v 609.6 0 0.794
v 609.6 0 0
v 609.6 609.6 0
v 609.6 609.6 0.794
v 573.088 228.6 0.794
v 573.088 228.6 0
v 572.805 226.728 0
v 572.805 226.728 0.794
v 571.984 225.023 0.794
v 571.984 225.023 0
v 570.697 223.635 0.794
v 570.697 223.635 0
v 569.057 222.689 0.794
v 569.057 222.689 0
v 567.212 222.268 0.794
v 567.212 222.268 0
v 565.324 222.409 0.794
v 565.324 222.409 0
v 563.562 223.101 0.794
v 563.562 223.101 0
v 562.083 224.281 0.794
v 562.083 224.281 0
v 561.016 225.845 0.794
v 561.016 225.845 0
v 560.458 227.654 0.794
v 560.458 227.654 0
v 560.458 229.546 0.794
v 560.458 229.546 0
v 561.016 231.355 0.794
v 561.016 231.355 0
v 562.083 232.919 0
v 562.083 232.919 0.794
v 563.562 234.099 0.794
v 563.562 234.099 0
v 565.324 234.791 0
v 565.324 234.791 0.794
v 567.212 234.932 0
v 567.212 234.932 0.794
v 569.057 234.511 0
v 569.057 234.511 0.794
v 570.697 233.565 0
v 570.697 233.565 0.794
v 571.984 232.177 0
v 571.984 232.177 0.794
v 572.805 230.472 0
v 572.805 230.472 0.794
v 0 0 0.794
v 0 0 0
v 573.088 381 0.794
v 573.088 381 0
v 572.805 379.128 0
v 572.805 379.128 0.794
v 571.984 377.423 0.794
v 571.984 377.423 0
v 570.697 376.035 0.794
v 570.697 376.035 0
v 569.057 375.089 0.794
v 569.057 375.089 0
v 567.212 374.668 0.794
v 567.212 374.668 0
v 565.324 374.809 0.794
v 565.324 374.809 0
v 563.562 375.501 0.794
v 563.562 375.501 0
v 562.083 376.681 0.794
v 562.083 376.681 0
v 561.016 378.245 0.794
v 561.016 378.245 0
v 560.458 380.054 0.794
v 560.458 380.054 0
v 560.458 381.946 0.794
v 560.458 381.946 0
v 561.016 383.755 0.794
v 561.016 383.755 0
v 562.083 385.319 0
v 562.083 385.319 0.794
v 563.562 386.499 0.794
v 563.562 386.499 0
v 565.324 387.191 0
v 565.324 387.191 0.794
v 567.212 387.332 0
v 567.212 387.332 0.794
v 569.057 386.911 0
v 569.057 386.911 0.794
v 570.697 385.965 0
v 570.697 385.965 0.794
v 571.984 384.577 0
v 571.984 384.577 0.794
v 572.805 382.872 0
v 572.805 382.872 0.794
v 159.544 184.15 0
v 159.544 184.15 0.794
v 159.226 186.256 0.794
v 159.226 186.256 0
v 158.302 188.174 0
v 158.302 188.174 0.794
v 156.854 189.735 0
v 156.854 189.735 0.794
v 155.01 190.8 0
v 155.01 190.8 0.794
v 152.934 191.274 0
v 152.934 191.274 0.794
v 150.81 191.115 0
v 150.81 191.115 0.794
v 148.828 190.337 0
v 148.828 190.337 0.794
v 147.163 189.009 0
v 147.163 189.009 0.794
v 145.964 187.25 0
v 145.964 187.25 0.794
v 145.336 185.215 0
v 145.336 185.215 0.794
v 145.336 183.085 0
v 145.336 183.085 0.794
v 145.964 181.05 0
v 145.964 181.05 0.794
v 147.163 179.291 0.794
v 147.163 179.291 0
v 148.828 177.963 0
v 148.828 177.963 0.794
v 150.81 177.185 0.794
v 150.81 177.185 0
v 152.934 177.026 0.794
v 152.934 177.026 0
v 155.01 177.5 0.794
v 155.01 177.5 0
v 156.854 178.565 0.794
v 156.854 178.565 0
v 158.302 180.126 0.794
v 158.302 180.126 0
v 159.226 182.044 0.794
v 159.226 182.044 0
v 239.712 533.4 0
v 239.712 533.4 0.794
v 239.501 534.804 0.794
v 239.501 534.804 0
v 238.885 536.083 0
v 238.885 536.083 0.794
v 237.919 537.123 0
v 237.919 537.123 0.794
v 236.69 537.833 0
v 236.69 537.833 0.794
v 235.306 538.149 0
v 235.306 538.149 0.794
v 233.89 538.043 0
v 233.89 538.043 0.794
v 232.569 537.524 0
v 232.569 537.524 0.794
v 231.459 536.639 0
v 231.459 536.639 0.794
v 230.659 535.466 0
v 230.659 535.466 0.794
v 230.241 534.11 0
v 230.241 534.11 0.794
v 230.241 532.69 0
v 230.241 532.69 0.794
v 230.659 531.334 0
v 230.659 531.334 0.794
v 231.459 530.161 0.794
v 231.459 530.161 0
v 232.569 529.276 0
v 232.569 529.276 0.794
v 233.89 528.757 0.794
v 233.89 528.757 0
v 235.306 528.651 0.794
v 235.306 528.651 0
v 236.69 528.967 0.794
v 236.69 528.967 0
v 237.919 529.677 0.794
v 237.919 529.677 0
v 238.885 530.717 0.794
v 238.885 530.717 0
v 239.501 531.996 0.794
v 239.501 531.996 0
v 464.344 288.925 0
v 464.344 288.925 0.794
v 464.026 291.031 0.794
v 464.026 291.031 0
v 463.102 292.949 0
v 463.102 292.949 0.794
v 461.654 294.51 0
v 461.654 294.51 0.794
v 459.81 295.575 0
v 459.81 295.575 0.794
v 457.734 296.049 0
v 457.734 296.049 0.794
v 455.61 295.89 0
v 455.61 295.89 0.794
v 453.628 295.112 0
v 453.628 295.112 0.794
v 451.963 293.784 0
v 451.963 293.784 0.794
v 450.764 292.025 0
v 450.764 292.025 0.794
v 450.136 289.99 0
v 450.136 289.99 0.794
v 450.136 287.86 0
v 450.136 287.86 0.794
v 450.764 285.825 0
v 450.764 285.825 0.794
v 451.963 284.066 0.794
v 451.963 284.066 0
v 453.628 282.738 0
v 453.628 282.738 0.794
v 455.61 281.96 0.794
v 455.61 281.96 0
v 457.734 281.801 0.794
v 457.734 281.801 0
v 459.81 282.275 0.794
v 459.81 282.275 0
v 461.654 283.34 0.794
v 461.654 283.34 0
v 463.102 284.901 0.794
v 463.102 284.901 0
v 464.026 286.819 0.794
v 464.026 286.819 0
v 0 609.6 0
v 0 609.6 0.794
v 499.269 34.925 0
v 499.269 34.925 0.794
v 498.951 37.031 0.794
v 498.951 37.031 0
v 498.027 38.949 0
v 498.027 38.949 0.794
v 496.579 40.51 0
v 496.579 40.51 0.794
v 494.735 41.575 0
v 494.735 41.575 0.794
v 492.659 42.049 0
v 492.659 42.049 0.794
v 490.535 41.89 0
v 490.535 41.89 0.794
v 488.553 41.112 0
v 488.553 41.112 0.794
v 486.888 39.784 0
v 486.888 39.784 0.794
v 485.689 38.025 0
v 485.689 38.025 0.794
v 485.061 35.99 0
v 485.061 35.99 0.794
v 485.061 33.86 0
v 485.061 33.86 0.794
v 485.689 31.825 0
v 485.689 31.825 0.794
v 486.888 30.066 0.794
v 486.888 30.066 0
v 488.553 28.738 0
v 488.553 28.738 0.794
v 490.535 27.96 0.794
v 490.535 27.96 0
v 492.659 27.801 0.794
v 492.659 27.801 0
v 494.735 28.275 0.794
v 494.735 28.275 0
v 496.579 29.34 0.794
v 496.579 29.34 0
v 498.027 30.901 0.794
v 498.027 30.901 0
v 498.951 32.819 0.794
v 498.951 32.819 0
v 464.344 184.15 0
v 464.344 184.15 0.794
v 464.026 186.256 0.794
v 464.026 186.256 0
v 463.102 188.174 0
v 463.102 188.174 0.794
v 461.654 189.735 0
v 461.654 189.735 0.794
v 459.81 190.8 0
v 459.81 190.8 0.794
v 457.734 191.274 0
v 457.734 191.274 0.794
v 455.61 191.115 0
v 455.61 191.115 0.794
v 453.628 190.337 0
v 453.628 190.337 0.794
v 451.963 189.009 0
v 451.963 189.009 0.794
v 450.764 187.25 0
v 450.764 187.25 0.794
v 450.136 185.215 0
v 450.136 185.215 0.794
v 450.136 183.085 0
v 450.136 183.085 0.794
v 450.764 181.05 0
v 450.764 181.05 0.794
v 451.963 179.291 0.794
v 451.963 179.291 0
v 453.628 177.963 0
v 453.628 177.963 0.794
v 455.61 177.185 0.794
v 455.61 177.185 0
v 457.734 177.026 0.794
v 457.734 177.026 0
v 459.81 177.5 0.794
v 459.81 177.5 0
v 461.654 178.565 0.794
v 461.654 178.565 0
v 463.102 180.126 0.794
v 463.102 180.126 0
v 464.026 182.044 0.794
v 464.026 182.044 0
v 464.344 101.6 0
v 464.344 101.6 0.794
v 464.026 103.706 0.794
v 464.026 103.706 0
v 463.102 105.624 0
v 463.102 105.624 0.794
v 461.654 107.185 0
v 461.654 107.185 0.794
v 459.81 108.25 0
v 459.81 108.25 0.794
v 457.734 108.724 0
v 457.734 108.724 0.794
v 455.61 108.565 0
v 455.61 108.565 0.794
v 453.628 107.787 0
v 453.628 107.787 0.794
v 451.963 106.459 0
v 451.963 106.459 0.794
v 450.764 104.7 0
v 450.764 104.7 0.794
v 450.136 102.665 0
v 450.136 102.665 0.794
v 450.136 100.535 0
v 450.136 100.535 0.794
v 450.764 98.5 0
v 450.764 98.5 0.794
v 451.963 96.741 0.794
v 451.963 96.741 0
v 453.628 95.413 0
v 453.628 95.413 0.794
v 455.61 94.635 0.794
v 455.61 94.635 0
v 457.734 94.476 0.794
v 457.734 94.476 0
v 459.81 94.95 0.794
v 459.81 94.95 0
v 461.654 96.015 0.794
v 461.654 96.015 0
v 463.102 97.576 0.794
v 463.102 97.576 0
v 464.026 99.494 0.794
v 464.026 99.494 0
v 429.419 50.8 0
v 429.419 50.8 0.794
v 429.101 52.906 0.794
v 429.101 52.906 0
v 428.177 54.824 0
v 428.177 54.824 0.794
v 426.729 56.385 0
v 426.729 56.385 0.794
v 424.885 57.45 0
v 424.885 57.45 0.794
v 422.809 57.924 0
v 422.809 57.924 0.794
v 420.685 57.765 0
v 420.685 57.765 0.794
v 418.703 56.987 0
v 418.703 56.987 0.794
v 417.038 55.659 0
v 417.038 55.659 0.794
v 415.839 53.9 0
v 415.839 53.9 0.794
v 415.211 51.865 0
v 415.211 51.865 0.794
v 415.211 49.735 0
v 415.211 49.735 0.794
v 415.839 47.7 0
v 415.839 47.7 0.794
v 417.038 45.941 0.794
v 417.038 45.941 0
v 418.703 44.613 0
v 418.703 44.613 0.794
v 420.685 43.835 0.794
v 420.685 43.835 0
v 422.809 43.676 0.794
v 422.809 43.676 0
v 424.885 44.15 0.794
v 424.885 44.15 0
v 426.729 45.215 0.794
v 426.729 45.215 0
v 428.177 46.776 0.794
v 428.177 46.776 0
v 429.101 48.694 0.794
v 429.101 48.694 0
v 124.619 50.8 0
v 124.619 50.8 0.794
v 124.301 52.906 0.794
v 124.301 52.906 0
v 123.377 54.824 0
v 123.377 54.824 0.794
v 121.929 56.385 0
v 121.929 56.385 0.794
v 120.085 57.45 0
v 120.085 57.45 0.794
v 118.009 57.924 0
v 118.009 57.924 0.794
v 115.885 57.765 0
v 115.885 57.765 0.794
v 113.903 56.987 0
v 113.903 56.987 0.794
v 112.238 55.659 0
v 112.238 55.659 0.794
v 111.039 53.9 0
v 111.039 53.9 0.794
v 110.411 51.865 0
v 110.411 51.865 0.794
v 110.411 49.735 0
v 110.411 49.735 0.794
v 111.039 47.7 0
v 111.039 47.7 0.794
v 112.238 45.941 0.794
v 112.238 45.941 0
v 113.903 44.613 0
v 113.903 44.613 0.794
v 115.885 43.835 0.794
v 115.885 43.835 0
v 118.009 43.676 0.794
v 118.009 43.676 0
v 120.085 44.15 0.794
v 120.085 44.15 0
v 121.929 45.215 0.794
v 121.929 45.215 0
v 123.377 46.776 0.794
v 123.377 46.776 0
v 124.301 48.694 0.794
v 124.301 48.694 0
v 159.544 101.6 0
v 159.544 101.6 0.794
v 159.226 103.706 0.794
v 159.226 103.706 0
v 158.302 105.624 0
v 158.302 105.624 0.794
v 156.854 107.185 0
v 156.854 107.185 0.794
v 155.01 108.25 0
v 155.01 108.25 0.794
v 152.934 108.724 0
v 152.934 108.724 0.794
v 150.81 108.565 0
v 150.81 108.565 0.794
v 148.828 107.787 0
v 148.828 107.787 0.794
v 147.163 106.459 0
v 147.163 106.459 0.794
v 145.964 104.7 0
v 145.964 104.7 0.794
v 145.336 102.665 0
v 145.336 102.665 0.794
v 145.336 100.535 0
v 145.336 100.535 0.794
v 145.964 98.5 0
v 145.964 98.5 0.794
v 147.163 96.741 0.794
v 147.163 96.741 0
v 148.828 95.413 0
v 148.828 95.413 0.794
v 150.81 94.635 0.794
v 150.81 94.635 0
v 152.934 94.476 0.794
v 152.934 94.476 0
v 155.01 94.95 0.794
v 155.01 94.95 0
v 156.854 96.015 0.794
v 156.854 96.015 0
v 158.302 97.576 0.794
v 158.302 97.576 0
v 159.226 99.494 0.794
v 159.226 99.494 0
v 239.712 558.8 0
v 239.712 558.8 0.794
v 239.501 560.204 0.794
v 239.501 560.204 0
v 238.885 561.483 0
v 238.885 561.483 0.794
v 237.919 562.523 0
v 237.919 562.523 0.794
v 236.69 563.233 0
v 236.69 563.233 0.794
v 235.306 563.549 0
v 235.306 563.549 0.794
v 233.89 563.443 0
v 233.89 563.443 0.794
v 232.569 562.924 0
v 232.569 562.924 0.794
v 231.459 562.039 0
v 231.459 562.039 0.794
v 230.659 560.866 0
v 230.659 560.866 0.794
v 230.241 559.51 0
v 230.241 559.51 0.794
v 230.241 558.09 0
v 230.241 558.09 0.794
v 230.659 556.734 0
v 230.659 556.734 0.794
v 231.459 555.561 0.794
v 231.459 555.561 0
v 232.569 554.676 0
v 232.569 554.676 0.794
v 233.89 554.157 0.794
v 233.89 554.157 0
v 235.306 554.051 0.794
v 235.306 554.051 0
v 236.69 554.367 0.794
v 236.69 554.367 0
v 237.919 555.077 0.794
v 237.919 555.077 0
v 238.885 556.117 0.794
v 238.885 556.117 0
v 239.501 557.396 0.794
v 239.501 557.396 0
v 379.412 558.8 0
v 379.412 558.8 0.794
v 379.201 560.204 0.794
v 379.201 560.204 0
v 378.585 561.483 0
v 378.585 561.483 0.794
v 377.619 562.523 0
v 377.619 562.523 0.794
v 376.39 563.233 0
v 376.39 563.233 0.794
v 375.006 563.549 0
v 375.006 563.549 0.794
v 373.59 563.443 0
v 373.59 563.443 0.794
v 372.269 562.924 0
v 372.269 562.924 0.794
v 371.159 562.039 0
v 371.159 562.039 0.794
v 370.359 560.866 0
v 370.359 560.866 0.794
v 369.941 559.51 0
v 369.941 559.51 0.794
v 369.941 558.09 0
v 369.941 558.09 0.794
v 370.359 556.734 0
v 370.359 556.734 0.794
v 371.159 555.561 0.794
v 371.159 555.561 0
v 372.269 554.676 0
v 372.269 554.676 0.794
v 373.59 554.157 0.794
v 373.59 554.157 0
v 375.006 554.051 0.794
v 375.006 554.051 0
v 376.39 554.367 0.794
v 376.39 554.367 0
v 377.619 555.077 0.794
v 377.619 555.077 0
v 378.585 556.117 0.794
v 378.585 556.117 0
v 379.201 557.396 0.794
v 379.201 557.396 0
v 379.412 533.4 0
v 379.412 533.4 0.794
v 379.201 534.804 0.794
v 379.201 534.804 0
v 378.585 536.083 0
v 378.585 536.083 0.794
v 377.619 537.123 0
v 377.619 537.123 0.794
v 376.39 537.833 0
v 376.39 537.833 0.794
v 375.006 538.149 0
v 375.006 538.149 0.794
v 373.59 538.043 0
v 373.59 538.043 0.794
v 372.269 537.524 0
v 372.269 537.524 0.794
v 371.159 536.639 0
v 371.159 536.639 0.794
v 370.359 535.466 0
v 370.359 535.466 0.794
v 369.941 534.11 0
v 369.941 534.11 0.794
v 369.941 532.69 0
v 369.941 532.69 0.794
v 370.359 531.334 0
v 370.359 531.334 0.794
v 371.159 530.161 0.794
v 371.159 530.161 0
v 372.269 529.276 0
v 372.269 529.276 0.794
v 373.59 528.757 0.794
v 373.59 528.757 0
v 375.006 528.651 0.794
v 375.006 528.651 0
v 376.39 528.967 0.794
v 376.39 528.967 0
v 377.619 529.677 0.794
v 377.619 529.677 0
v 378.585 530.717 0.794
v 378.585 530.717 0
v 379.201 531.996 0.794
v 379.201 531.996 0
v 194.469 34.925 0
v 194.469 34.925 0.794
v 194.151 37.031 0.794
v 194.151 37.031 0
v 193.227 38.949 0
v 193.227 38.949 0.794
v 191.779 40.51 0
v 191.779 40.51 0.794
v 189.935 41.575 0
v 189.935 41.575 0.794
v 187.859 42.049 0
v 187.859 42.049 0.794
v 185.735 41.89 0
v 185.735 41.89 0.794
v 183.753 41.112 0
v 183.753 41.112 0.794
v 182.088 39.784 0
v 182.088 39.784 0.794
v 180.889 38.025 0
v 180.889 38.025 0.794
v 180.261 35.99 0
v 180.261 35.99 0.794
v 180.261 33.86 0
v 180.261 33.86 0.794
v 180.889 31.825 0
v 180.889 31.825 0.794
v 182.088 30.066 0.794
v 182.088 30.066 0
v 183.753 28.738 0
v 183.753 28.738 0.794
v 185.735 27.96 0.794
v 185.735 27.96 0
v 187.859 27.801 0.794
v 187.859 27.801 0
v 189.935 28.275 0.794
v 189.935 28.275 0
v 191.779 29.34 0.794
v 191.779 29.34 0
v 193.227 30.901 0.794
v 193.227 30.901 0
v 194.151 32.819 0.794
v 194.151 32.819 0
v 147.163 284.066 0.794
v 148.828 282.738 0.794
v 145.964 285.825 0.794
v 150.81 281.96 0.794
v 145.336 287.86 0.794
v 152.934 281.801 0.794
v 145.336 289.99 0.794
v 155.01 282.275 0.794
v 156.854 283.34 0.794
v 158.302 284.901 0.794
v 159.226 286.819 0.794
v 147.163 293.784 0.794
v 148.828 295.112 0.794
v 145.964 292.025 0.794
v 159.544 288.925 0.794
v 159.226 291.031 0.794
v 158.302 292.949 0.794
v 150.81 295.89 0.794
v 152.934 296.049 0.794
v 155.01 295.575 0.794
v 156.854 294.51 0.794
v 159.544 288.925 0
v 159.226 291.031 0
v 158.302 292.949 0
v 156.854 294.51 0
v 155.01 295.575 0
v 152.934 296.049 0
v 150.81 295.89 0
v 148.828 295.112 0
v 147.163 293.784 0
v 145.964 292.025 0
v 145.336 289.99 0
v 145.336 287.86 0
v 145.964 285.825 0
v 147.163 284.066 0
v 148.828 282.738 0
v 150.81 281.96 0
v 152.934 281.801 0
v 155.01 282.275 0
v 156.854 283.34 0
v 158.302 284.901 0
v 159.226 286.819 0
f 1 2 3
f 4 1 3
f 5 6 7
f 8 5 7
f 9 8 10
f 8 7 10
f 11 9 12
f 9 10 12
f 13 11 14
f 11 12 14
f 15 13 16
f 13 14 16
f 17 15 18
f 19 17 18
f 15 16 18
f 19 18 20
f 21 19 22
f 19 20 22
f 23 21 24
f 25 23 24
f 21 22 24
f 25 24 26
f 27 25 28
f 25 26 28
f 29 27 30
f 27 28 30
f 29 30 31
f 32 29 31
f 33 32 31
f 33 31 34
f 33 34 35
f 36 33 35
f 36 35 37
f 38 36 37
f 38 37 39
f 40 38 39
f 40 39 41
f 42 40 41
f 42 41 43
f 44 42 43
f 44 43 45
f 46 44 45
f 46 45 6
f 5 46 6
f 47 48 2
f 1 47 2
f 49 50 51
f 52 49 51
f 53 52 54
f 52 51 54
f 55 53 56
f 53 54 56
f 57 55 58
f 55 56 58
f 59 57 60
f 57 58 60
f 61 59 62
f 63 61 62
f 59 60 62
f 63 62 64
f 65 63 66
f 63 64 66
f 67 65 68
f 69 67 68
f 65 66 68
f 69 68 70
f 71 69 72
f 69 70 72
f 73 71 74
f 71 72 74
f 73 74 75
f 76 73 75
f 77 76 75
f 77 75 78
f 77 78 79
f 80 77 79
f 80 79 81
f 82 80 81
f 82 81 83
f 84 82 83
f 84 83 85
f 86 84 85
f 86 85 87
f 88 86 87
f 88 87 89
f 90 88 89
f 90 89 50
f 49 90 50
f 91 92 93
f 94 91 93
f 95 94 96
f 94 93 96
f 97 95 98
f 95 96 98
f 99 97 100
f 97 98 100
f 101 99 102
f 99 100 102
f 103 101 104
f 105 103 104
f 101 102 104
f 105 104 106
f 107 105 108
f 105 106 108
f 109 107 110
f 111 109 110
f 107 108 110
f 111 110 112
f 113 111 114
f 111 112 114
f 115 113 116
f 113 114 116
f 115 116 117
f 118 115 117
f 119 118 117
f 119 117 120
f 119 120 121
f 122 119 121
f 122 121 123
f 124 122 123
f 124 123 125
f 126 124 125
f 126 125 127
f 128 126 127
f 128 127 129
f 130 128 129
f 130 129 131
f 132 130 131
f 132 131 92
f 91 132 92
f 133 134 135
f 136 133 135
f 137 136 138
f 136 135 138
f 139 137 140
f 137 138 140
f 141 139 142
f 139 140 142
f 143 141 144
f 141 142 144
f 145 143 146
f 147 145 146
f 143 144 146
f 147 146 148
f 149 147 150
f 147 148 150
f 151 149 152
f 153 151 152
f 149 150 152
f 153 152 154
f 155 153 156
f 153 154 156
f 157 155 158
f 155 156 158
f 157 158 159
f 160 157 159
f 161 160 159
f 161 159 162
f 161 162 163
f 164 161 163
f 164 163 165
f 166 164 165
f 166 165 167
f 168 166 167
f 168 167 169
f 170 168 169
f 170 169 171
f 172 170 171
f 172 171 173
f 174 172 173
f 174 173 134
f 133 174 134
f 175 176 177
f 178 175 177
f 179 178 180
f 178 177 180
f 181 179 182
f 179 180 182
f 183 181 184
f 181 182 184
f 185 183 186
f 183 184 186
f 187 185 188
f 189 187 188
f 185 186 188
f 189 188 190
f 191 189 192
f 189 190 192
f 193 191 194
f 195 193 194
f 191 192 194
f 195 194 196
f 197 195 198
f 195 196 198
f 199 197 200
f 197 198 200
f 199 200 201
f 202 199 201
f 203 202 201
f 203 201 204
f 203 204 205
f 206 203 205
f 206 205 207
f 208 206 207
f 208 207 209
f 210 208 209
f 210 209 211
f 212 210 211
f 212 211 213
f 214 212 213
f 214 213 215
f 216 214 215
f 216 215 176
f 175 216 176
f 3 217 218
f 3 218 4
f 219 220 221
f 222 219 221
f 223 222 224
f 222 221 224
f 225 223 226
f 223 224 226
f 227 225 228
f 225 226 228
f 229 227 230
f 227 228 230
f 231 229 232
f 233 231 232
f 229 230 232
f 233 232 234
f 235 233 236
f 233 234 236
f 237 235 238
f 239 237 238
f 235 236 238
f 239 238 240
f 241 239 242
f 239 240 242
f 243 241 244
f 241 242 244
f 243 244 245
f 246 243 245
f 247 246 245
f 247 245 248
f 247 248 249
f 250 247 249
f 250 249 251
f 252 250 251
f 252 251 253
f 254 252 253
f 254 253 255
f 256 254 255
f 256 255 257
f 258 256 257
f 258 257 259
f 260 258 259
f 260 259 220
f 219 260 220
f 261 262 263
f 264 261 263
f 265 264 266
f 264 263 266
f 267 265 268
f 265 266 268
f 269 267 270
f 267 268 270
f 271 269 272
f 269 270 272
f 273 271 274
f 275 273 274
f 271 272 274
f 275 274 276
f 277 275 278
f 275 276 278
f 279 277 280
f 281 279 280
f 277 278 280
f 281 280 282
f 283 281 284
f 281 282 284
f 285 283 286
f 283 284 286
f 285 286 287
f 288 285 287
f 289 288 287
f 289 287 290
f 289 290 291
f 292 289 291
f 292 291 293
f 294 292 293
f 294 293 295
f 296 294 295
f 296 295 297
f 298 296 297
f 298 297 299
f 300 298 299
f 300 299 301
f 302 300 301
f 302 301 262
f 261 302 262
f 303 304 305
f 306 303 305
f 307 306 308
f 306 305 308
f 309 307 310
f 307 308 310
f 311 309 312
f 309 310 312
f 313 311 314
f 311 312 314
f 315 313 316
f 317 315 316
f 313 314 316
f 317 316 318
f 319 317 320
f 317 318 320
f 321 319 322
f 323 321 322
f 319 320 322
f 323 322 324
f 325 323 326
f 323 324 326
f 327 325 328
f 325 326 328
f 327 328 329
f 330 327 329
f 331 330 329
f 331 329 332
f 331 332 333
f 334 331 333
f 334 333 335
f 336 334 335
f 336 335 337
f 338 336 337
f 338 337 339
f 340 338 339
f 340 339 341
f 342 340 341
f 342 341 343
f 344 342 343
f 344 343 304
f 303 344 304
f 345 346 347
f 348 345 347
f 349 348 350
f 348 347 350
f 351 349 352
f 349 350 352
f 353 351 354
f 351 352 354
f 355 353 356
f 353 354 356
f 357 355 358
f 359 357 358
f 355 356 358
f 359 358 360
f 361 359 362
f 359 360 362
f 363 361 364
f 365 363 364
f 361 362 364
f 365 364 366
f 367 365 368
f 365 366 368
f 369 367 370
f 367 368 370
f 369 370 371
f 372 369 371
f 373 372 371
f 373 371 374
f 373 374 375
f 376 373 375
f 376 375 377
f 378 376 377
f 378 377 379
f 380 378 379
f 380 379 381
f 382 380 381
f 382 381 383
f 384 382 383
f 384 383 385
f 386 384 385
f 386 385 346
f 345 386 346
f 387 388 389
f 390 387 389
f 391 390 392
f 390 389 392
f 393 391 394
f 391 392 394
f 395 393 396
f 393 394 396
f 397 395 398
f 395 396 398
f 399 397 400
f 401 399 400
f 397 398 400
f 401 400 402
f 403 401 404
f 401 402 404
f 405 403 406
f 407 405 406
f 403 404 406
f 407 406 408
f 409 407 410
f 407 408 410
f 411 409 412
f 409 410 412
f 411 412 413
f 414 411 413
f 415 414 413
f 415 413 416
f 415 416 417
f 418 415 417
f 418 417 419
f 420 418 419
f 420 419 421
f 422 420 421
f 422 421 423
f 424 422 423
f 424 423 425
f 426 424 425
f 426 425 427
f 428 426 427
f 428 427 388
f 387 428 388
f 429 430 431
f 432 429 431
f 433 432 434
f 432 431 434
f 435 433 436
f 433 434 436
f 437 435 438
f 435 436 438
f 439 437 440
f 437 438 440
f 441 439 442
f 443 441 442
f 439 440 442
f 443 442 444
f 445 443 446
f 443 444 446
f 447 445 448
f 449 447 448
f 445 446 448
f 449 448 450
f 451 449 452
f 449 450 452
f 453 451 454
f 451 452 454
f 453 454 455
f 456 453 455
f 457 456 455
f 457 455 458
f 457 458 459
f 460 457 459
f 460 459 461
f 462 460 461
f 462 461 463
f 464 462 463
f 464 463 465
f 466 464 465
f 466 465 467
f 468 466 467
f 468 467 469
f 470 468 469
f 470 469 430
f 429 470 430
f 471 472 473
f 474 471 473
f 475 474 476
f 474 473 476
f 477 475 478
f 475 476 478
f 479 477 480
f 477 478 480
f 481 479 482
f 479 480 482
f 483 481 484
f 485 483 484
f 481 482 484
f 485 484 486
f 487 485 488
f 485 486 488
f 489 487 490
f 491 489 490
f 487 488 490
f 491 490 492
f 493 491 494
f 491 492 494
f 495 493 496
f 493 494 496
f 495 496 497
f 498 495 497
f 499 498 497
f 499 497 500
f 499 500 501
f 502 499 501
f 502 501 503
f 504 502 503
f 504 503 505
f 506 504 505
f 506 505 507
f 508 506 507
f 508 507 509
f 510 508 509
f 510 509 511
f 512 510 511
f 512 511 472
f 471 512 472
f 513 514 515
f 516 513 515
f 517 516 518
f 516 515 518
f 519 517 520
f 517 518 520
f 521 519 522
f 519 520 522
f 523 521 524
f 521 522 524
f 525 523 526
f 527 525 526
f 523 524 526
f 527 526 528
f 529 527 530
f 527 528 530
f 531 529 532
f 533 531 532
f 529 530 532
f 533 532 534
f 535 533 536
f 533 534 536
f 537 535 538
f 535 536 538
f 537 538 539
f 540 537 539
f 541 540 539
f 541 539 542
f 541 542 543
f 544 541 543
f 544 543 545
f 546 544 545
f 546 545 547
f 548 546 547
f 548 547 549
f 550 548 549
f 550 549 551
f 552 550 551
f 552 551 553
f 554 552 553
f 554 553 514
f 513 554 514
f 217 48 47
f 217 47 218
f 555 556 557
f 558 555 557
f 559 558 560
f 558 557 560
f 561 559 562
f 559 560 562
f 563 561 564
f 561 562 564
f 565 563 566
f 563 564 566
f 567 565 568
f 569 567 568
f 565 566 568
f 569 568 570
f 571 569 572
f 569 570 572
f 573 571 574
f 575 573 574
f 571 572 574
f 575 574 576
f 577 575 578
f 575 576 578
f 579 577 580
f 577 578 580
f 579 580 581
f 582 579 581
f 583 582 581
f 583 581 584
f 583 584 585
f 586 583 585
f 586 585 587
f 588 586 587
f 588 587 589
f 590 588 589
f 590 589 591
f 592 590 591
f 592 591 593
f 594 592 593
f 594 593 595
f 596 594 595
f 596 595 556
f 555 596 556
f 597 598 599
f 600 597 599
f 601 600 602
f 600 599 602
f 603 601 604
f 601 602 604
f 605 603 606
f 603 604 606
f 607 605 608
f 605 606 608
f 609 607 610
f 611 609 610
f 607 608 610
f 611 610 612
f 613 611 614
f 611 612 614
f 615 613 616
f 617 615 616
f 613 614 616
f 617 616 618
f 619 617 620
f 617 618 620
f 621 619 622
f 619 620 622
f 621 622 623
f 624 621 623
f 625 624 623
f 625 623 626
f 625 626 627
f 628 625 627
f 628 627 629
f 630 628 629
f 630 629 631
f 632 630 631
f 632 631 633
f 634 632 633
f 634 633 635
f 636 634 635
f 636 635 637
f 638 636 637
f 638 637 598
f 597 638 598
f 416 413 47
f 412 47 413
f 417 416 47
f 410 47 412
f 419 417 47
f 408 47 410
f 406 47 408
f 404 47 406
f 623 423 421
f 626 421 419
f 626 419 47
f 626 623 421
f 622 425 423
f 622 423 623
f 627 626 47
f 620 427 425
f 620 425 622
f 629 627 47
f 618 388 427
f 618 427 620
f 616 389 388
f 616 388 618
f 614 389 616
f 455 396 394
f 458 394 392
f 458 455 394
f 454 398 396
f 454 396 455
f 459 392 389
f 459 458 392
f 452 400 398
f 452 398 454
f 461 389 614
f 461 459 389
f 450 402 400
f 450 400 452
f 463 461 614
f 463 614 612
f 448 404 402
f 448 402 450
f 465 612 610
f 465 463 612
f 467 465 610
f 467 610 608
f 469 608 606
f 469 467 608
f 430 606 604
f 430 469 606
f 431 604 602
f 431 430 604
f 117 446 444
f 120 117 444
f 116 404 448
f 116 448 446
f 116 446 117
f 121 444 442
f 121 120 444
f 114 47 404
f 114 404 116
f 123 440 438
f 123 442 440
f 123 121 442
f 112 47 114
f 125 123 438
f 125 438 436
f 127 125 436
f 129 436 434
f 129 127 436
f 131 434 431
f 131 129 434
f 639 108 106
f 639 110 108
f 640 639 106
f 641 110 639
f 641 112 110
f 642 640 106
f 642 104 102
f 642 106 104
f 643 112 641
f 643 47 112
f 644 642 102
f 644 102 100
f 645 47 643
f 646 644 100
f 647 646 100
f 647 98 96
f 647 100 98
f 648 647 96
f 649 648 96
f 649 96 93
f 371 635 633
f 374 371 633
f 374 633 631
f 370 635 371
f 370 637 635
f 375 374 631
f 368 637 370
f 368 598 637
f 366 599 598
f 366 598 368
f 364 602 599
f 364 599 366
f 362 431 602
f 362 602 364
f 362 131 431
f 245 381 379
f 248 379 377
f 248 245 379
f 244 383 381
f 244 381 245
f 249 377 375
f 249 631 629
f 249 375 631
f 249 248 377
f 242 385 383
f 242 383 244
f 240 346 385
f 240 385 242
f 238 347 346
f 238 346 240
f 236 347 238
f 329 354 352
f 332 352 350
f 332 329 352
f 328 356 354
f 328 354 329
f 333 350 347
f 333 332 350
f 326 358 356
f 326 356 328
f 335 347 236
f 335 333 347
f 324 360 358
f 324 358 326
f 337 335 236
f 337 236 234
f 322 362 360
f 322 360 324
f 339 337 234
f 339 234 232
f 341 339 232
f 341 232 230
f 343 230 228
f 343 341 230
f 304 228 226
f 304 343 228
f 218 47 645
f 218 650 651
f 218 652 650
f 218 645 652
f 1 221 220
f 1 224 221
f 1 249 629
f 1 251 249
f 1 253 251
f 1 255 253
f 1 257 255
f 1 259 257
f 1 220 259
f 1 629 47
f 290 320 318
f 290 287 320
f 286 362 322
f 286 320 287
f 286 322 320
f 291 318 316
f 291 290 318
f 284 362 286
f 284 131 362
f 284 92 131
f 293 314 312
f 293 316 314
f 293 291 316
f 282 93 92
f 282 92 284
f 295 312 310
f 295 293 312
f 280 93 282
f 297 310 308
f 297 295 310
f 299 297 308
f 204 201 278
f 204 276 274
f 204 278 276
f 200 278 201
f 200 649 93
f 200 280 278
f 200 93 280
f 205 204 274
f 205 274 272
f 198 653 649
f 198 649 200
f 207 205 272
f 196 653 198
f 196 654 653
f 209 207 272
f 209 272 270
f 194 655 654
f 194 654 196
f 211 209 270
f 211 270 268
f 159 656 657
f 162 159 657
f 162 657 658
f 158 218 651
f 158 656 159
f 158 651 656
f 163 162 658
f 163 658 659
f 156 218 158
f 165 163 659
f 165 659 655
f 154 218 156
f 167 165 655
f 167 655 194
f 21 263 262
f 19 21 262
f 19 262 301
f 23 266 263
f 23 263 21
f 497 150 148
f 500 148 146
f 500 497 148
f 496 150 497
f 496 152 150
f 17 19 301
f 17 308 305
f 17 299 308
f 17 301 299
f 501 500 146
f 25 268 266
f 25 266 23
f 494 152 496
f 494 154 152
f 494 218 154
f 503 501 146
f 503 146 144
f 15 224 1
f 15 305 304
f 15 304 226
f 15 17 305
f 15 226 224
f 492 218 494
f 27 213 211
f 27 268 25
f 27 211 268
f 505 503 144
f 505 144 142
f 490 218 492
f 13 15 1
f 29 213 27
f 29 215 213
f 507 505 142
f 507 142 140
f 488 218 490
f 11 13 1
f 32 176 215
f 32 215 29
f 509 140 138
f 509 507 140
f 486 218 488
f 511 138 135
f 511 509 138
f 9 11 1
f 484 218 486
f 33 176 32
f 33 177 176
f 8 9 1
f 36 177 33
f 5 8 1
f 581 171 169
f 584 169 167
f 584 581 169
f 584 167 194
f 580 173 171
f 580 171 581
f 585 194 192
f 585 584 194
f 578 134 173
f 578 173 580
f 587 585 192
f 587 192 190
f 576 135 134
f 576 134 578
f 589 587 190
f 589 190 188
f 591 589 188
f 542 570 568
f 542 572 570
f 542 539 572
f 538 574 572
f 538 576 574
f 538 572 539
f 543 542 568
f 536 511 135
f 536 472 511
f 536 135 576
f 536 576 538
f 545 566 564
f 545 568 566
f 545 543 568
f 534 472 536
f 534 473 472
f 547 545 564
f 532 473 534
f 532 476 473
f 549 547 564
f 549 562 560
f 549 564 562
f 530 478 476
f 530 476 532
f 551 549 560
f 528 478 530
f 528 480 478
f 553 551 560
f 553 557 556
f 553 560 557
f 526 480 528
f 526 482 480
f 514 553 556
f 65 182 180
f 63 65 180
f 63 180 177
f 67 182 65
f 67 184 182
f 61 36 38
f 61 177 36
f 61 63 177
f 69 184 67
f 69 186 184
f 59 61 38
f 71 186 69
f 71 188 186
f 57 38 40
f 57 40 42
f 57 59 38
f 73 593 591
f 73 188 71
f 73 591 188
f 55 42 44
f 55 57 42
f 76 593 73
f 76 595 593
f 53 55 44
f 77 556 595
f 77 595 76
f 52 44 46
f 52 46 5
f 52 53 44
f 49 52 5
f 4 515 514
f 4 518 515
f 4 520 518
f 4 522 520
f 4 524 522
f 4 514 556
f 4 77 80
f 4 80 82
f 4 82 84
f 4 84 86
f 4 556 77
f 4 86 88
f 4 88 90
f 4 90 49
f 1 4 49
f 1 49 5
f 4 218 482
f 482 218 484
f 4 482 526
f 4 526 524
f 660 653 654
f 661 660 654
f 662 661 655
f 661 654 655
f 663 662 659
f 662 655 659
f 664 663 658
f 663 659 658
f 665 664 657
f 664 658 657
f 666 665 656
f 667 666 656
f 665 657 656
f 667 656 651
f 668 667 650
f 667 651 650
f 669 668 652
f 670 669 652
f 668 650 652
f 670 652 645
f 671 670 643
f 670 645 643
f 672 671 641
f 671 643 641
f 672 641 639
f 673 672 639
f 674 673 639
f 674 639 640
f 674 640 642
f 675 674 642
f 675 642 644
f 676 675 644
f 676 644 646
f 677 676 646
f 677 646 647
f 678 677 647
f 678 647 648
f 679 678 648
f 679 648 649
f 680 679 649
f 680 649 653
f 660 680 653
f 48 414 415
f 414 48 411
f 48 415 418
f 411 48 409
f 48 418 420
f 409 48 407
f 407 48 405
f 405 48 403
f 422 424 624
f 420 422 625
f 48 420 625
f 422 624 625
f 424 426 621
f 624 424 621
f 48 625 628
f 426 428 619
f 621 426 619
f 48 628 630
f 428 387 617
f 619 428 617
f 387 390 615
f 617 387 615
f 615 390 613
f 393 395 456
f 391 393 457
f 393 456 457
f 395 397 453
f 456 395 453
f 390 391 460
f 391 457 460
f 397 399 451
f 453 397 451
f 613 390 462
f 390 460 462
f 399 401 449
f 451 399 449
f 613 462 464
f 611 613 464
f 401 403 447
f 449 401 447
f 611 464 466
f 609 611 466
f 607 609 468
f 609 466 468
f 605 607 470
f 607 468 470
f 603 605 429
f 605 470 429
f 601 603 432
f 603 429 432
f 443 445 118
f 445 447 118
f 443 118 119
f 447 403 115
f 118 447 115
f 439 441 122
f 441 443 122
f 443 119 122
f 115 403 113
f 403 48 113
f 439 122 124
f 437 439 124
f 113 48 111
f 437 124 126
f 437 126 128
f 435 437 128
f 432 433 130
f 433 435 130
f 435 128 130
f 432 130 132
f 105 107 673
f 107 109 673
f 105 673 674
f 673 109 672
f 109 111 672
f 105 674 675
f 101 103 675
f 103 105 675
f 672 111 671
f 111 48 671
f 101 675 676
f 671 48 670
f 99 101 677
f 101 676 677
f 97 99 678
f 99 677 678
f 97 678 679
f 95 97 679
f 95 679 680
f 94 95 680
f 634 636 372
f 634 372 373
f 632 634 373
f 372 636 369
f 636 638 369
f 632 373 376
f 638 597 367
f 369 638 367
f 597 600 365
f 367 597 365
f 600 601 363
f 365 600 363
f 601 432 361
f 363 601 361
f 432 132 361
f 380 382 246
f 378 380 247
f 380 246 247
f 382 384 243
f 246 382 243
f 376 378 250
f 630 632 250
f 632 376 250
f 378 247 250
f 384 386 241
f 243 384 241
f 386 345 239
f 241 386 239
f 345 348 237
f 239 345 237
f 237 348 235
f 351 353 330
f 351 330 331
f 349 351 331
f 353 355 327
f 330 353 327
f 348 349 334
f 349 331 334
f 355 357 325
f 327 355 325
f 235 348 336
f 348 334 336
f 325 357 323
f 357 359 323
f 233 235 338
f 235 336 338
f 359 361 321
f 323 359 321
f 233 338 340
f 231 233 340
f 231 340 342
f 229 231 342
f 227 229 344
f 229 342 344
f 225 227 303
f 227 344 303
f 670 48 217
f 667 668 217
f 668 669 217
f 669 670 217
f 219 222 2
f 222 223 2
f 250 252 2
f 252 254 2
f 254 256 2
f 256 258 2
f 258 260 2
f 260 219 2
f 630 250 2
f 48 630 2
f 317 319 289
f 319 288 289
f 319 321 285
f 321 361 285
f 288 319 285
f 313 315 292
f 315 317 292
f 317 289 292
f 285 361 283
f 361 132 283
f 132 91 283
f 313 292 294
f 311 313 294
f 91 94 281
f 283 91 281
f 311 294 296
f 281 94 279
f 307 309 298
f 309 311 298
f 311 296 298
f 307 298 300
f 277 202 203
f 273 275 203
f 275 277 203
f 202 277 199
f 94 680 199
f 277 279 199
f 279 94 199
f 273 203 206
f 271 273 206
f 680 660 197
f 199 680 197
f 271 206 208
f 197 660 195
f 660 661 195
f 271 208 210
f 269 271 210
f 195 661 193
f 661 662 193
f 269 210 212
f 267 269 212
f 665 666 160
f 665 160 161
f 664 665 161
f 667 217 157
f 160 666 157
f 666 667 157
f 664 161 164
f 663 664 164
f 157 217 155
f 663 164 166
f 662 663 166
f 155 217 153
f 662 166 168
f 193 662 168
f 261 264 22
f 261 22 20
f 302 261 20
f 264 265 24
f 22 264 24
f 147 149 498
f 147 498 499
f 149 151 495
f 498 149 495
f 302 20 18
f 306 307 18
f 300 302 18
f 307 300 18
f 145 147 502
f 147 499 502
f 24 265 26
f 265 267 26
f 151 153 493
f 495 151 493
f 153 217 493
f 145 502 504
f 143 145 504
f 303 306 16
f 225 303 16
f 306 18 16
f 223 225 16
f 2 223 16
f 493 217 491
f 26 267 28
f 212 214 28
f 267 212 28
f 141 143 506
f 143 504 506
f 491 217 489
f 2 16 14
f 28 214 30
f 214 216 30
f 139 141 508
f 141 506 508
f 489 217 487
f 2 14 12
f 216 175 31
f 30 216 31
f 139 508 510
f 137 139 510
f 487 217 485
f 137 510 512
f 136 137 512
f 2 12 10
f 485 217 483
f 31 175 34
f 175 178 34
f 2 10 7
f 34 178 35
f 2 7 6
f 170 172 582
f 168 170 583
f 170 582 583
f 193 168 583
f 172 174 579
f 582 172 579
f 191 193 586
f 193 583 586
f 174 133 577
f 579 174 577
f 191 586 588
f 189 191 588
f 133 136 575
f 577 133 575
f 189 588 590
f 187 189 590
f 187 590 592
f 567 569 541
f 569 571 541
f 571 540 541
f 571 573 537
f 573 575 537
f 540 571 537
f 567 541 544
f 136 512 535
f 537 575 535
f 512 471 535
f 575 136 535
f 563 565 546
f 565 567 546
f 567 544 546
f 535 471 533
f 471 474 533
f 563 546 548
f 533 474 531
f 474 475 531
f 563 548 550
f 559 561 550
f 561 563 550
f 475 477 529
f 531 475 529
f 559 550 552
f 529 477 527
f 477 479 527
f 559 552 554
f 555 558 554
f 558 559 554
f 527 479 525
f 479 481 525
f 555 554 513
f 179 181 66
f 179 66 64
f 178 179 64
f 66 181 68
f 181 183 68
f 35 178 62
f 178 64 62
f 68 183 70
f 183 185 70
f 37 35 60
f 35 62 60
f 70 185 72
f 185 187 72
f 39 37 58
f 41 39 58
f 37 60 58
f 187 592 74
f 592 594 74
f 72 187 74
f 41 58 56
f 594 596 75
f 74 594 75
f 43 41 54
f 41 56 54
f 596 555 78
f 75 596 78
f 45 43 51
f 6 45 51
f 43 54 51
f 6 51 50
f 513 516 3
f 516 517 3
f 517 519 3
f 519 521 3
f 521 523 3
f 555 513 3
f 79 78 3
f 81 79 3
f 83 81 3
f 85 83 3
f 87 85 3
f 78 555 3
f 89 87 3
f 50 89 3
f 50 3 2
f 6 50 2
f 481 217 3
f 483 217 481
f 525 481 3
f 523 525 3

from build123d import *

# Parameters (mm, degrees)
F0_W     = 609.6
F0_H     = 609.6
F1_DEPTH = 0.79375
F2_R     = 7.14375
F3_DEPTH = 25.4
F4_R     = 4.7625
F5_DEPTH = 25.4
F6_R     = 6.35
F7_DEPTH = 25.4


# Not quite as in the source:
# - a feature names something its author has since deleted; it is built from what else it names


with BuildPart() as f1:
    # F0 (on Top) → F1 (new body)
    with BuildSketch(Plane.XY):
        with Locations((304.8, 304.8)):
            Rectangle(F0_W, F0_H)
    extrude(amount=F1_DEPTH)

    # F2 (on face) → F3 (cut)
    with BuildSketch(Plane.XY.offset(0.79375)):
        with Locations((187.325, 34.925)):
            Circle(F2_R)
        with Locations((117.475, 50.8)):
            Circle(F2_R)
        with Locations((152.4, 101.6)):
            Circle(F2_R)
        with Locations((152.4, 184.15)):
            Circle(F2_R)
        with Locations((152.4, 288.925)):
            Circle(F2_R)
        with Locations((457.2, 288.925)):
            Circle(F2_R)
        with Locations((457.2, 184.15)):
            Circle(F2_R)
        with Locations((457.2, 101.6)):
            Circle(F2_R)
        with Locations((422.275, 50.8)):
            Circle(F2_R)
        with Locations((492.125, 34.925)):
            Circle(F2_R)
    extrude(amount=-F3_DEPTH, mode=Mode.SUBTRACT)

    # F4 (on face) → F5 (cut)
    with BuildSketch(Plane.XY.offset(0.79375)):
        with Locations((234.95, 558.8)):
            Circle(F4_R)
        with Locations((234.95, 533.4)):
            Circle(F4_R)
        with Locations((374.65, 533.4)):
            Circle(F4_R)
        with Locations((374.65, 558.8)):
            Circle(F4_R)
    extrude(amount=-F5_DEPTH, mode=Mode.SUBTRACT)

    # F6 (on face) → F7 (cut)
    with BuildSketch(Plane(origin=(0, 0, 0), x_dir=(1, 0, 0), z_dir=(0, 0, -1))):
        with Locations((566.7375, -381)):
            Circle(F6_R)
        with Locations((566.7375, -228.6)):
            Circle(F6_R)
    extrude(amount=-F7_DEPTH, mode=Mode.SUBTRACT)


solid = f1.part
